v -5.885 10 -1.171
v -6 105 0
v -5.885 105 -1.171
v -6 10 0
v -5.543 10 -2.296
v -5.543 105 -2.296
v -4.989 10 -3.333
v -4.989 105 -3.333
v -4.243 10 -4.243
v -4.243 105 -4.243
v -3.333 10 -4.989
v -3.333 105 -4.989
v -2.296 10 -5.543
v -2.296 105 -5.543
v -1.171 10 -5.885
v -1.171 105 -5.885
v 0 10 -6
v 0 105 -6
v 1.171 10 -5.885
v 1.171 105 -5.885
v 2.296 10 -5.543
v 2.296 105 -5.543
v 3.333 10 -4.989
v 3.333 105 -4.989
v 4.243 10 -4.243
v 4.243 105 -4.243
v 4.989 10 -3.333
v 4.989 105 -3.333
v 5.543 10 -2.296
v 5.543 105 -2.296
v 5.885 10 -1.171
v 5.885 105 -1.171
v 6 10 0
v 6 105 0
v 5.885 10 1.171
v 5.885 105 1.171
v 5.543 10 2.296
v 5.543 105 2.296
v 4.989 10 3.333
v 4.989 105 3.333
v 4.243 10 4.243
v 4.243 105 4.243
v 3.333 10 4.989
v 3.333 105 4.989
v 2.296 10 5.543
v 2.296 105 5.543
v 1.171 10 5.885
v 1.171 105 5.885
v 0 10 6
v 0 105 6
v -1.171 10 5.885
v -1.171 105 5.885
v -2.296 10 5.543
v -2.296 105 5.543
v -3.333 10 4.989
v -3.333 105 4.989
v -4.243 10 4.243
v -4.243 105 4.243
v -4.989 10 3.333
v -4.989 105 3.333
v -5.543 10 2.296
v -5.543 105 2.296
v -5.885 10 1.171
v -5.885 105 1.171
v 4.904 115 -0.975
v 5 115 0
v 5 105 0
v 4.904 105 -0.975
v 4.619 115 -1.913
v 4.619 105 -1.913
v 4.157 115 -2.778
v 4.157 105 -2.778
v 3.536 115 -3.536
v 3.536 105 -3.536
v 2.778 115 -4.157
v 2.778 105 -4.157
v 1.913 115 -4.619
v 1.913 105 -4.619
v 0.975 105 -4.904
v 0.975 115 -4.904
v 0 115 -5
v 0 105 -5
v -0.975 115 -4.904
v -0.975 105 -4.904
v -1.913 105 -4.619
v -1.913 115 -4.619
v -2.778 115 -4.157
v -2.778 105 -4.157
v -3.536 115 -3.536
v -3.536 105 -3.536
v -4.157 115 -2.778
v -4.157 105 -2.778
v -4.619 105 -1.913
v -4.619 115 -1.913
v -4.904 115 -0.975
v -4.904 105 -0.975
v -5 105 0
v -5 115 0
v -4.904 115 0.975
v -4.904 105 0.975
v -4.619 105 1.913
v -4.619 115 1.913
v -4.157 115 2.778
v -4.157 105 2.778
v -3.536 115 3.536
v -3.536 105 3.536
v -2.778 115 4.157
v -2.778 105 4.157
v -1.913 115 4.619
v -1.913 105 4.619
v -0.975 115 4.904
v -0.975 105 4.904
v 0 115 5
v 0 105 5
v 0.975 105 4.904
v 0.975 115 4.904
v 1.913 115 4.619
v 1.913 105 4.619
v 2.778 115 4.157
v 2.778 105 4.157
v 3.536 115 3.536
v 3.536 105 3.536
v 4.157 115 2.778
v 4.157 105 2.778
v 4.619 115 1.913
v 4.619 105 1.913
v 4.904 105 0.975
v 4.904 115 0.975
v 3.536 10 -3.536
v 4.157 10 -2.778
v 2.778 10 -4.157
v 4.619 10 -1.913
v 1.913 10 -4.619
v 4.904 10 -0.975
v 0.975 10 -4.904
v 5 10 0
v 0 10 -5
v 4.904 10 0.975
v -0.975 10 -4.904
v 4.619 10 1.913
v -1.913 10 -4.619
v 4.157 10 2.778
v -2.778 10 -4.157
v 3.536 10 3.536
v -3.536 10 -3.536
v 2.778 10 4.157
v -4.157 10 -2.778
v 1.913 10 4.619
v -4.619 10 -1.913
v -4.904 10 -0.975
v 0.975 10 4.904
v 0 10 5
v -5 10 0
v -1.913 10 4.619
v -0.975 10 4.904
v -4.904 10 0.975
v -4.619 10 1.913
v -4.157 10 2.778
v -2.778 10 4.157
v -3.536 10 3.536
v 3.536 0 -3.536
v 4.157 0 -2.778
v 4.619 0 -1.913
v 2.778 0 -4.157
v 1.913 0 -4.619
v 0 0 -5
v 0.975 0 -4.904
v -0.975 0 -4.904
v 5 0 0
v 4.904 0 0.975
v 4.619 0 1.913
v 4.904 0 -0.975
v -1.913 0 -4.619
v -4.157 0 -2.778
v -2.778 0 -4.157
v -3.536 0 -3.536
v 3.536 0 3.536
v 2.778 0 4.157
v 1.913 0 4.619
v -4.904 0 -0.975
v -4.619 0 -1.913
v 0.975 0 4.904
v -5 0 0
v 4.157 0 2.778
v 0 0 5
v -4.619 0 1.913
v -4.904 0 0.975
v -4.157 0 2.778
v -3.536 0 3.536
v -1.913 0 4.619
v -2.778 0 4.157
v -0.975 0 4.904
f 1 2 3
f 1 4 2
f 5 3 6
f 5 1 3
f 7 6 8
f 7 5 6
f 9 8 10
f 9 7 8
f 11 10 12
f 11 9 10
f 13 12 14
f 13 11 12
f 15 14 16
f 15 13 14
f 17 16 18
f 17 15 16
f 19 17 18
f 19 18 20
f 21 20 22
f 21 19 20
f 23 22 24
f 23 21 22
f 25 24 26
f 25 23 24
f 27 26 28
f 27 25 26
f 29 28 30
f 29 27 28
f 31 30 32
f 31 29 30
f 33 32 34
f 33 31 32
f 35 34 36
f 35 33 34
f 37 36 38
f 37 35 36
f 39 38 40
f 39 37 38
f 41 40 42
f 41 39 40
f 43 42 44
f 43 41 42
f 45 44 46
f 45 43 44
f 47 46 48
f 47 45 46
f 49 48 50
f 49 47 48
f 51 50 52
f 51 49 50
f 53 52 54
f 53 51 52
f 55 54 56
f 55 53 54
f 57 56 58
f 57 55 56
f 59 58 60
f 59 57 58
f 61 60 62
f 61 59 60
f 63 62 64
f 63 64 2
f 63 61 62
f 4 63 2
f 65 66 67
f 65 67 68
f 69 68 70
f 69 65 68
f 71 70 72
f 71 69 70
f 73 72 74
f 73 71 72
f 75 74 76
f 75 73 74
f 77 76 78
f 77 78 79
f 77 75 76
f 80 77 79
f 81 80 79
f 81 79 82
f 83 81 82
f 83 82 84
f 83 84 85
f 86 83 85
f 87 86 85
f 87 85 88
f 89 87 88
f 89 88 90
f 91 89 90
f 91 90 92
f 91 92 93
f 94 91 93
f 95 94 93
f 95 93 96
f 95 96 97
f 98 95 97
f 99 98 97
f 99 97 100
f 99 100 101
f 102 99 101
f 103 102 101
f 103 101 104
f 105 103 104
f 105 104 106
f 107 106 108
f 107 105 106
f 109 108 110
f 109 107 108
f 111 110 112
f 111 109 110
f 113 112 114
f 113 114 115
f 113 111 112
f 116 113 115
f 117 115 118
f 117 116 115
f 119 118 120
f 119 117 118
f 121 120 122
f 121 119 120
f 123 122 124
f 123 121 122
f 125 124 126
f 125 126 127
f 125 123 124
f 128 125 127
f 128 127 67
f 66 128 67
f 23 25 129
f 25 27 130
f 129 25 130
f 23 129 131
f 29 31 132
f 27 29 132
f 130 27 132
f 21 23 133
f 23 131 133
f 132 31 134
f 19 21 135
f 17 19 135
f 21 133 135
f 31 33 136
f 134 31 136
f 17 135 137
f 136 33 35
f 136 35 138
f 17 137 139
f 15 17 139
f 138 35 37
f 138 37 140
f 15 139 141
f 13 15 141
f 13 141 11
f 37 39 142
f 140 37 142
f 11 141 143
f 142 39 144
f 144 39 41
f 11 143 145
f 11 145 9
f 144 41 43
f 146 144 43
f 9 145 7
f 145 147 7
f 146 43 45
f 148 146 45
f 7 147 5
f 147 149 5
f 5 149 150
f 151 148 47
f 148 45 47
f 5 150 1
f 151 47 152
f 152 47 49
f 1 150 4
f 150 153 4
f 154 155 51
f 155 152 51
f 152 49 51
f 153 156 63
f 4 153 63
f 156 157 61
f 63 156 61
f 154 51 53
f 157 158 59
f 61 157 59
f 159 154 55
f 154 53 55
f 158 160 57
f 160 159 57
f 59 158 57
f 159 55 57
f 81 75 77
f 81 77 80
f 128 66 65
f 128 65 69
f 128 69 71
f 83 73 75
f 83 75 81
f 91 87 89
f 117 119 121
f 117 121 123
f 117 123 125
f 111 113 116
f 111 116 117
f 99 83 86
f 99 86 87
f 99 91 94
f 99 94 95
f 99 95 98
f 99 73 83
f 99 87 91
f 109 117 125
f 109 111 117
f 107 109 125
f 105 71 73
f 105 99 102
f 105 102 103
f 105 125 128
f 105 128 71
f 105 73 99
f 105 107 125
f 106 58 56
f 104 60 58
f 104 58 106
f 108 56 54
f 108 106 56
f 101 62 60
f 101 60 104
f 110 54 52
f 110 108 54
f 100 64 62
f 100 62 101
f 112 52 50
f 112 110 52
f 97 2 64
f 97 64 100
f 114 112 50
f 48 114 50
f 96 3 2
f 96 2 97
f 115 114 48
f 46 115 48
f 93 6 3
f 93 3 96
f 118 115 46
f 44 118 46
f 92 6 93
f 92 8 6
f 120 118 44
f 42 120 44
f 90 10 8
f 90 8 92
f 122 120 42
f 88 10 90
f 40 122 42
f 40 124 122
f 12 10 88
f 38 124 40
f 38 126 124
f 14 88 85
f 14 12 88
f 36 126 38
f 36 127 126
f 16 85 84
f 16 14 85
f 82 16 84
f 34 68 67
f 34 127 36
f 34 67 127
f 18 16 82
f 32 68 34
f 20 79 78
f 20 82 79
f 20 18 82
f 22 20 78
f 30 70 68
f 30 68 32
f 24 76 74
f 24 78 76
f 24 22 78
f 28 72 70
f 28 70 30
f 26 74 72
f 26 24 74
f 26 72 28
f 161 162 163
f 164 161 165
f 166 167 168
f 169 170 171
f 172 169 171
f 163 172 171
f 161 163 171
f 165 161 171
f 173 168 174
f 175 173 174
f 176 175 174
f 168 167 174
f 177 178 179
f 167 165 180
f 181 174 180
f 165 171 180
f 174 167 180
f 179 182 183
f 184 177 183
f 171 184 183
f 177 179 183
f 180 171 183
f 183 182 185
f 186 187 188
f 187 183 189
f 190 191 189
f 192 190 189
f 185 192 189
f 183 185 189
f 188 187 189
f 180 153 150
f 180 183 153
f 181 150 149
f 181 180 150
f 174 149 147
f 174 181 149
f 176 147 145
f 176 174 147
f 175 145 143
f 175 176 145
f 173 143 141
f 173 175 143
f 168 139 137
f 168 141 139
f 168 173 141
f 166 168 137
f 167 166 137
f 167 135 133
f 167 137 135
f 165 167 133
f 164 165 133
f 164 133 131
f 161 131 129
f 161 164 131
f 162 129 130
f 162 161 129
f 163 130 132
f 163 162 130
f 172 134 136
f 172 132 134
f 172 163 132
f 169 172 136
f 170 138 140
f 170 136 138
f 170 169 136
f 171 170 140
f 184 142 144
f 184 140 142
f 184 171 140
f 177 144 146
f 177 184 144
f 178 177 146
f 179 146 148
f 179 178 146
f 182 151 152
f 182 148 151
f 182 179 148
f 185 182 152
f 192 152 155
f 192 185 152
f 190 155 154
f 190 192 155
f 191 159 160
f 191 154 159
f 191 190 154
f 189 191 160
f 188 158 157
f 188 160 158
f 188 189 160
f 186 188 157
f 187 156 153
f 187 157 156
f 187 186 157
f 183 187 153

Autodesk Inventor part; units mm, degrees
ref_plane "YZ Plane" through (0, 0, 0) normal (1, 0, 0) x (0, 1, 0)
ref_plane "XZ Plane" through (0, 0, 0) normal (0, 1, 0) x (-1, 0, 0)
ref_plane "XY Plane" through (0, 0, 0) normal (0, 0, 1) x (1, 0, 0)
sketch "Sketch1" plane through (0, 0, 0) normal (0, 1, 0) x (-1, 0, 0)
  circle A0 centre (0, 0) radius 6
  circle A1 centre (0, 0) radius 5
  dimension "d0" = 12
  dimension "d1" = 10
extrude "Extrusion1" add sketch "Sketch1" along normal blind 115 contours A0 | A1
extrude "Extrusion2" cut sketch "Sketch1" along normal blind 10
sketch "Sketch2" plane through (0, 115, 0) normal (0, 1, 0) x (1, 0, 0)
  circle A0 centre (0, 0) radius 5
  circle A1 centre (0, 0) radius 6 projected
  dimension "d6" = 10
extrude "Extrusion3" cut sketch "Sketch2" against normal blind 10
thread "Thread1" size "M10x1" class "6g" standard "ANSI Metric M Profile" length 30
thread "Thread2" size "M10x1" class "6g" standard "ANSI Metric M Profile" length 30
properties part number "Handle" material "Stainless Steel"
